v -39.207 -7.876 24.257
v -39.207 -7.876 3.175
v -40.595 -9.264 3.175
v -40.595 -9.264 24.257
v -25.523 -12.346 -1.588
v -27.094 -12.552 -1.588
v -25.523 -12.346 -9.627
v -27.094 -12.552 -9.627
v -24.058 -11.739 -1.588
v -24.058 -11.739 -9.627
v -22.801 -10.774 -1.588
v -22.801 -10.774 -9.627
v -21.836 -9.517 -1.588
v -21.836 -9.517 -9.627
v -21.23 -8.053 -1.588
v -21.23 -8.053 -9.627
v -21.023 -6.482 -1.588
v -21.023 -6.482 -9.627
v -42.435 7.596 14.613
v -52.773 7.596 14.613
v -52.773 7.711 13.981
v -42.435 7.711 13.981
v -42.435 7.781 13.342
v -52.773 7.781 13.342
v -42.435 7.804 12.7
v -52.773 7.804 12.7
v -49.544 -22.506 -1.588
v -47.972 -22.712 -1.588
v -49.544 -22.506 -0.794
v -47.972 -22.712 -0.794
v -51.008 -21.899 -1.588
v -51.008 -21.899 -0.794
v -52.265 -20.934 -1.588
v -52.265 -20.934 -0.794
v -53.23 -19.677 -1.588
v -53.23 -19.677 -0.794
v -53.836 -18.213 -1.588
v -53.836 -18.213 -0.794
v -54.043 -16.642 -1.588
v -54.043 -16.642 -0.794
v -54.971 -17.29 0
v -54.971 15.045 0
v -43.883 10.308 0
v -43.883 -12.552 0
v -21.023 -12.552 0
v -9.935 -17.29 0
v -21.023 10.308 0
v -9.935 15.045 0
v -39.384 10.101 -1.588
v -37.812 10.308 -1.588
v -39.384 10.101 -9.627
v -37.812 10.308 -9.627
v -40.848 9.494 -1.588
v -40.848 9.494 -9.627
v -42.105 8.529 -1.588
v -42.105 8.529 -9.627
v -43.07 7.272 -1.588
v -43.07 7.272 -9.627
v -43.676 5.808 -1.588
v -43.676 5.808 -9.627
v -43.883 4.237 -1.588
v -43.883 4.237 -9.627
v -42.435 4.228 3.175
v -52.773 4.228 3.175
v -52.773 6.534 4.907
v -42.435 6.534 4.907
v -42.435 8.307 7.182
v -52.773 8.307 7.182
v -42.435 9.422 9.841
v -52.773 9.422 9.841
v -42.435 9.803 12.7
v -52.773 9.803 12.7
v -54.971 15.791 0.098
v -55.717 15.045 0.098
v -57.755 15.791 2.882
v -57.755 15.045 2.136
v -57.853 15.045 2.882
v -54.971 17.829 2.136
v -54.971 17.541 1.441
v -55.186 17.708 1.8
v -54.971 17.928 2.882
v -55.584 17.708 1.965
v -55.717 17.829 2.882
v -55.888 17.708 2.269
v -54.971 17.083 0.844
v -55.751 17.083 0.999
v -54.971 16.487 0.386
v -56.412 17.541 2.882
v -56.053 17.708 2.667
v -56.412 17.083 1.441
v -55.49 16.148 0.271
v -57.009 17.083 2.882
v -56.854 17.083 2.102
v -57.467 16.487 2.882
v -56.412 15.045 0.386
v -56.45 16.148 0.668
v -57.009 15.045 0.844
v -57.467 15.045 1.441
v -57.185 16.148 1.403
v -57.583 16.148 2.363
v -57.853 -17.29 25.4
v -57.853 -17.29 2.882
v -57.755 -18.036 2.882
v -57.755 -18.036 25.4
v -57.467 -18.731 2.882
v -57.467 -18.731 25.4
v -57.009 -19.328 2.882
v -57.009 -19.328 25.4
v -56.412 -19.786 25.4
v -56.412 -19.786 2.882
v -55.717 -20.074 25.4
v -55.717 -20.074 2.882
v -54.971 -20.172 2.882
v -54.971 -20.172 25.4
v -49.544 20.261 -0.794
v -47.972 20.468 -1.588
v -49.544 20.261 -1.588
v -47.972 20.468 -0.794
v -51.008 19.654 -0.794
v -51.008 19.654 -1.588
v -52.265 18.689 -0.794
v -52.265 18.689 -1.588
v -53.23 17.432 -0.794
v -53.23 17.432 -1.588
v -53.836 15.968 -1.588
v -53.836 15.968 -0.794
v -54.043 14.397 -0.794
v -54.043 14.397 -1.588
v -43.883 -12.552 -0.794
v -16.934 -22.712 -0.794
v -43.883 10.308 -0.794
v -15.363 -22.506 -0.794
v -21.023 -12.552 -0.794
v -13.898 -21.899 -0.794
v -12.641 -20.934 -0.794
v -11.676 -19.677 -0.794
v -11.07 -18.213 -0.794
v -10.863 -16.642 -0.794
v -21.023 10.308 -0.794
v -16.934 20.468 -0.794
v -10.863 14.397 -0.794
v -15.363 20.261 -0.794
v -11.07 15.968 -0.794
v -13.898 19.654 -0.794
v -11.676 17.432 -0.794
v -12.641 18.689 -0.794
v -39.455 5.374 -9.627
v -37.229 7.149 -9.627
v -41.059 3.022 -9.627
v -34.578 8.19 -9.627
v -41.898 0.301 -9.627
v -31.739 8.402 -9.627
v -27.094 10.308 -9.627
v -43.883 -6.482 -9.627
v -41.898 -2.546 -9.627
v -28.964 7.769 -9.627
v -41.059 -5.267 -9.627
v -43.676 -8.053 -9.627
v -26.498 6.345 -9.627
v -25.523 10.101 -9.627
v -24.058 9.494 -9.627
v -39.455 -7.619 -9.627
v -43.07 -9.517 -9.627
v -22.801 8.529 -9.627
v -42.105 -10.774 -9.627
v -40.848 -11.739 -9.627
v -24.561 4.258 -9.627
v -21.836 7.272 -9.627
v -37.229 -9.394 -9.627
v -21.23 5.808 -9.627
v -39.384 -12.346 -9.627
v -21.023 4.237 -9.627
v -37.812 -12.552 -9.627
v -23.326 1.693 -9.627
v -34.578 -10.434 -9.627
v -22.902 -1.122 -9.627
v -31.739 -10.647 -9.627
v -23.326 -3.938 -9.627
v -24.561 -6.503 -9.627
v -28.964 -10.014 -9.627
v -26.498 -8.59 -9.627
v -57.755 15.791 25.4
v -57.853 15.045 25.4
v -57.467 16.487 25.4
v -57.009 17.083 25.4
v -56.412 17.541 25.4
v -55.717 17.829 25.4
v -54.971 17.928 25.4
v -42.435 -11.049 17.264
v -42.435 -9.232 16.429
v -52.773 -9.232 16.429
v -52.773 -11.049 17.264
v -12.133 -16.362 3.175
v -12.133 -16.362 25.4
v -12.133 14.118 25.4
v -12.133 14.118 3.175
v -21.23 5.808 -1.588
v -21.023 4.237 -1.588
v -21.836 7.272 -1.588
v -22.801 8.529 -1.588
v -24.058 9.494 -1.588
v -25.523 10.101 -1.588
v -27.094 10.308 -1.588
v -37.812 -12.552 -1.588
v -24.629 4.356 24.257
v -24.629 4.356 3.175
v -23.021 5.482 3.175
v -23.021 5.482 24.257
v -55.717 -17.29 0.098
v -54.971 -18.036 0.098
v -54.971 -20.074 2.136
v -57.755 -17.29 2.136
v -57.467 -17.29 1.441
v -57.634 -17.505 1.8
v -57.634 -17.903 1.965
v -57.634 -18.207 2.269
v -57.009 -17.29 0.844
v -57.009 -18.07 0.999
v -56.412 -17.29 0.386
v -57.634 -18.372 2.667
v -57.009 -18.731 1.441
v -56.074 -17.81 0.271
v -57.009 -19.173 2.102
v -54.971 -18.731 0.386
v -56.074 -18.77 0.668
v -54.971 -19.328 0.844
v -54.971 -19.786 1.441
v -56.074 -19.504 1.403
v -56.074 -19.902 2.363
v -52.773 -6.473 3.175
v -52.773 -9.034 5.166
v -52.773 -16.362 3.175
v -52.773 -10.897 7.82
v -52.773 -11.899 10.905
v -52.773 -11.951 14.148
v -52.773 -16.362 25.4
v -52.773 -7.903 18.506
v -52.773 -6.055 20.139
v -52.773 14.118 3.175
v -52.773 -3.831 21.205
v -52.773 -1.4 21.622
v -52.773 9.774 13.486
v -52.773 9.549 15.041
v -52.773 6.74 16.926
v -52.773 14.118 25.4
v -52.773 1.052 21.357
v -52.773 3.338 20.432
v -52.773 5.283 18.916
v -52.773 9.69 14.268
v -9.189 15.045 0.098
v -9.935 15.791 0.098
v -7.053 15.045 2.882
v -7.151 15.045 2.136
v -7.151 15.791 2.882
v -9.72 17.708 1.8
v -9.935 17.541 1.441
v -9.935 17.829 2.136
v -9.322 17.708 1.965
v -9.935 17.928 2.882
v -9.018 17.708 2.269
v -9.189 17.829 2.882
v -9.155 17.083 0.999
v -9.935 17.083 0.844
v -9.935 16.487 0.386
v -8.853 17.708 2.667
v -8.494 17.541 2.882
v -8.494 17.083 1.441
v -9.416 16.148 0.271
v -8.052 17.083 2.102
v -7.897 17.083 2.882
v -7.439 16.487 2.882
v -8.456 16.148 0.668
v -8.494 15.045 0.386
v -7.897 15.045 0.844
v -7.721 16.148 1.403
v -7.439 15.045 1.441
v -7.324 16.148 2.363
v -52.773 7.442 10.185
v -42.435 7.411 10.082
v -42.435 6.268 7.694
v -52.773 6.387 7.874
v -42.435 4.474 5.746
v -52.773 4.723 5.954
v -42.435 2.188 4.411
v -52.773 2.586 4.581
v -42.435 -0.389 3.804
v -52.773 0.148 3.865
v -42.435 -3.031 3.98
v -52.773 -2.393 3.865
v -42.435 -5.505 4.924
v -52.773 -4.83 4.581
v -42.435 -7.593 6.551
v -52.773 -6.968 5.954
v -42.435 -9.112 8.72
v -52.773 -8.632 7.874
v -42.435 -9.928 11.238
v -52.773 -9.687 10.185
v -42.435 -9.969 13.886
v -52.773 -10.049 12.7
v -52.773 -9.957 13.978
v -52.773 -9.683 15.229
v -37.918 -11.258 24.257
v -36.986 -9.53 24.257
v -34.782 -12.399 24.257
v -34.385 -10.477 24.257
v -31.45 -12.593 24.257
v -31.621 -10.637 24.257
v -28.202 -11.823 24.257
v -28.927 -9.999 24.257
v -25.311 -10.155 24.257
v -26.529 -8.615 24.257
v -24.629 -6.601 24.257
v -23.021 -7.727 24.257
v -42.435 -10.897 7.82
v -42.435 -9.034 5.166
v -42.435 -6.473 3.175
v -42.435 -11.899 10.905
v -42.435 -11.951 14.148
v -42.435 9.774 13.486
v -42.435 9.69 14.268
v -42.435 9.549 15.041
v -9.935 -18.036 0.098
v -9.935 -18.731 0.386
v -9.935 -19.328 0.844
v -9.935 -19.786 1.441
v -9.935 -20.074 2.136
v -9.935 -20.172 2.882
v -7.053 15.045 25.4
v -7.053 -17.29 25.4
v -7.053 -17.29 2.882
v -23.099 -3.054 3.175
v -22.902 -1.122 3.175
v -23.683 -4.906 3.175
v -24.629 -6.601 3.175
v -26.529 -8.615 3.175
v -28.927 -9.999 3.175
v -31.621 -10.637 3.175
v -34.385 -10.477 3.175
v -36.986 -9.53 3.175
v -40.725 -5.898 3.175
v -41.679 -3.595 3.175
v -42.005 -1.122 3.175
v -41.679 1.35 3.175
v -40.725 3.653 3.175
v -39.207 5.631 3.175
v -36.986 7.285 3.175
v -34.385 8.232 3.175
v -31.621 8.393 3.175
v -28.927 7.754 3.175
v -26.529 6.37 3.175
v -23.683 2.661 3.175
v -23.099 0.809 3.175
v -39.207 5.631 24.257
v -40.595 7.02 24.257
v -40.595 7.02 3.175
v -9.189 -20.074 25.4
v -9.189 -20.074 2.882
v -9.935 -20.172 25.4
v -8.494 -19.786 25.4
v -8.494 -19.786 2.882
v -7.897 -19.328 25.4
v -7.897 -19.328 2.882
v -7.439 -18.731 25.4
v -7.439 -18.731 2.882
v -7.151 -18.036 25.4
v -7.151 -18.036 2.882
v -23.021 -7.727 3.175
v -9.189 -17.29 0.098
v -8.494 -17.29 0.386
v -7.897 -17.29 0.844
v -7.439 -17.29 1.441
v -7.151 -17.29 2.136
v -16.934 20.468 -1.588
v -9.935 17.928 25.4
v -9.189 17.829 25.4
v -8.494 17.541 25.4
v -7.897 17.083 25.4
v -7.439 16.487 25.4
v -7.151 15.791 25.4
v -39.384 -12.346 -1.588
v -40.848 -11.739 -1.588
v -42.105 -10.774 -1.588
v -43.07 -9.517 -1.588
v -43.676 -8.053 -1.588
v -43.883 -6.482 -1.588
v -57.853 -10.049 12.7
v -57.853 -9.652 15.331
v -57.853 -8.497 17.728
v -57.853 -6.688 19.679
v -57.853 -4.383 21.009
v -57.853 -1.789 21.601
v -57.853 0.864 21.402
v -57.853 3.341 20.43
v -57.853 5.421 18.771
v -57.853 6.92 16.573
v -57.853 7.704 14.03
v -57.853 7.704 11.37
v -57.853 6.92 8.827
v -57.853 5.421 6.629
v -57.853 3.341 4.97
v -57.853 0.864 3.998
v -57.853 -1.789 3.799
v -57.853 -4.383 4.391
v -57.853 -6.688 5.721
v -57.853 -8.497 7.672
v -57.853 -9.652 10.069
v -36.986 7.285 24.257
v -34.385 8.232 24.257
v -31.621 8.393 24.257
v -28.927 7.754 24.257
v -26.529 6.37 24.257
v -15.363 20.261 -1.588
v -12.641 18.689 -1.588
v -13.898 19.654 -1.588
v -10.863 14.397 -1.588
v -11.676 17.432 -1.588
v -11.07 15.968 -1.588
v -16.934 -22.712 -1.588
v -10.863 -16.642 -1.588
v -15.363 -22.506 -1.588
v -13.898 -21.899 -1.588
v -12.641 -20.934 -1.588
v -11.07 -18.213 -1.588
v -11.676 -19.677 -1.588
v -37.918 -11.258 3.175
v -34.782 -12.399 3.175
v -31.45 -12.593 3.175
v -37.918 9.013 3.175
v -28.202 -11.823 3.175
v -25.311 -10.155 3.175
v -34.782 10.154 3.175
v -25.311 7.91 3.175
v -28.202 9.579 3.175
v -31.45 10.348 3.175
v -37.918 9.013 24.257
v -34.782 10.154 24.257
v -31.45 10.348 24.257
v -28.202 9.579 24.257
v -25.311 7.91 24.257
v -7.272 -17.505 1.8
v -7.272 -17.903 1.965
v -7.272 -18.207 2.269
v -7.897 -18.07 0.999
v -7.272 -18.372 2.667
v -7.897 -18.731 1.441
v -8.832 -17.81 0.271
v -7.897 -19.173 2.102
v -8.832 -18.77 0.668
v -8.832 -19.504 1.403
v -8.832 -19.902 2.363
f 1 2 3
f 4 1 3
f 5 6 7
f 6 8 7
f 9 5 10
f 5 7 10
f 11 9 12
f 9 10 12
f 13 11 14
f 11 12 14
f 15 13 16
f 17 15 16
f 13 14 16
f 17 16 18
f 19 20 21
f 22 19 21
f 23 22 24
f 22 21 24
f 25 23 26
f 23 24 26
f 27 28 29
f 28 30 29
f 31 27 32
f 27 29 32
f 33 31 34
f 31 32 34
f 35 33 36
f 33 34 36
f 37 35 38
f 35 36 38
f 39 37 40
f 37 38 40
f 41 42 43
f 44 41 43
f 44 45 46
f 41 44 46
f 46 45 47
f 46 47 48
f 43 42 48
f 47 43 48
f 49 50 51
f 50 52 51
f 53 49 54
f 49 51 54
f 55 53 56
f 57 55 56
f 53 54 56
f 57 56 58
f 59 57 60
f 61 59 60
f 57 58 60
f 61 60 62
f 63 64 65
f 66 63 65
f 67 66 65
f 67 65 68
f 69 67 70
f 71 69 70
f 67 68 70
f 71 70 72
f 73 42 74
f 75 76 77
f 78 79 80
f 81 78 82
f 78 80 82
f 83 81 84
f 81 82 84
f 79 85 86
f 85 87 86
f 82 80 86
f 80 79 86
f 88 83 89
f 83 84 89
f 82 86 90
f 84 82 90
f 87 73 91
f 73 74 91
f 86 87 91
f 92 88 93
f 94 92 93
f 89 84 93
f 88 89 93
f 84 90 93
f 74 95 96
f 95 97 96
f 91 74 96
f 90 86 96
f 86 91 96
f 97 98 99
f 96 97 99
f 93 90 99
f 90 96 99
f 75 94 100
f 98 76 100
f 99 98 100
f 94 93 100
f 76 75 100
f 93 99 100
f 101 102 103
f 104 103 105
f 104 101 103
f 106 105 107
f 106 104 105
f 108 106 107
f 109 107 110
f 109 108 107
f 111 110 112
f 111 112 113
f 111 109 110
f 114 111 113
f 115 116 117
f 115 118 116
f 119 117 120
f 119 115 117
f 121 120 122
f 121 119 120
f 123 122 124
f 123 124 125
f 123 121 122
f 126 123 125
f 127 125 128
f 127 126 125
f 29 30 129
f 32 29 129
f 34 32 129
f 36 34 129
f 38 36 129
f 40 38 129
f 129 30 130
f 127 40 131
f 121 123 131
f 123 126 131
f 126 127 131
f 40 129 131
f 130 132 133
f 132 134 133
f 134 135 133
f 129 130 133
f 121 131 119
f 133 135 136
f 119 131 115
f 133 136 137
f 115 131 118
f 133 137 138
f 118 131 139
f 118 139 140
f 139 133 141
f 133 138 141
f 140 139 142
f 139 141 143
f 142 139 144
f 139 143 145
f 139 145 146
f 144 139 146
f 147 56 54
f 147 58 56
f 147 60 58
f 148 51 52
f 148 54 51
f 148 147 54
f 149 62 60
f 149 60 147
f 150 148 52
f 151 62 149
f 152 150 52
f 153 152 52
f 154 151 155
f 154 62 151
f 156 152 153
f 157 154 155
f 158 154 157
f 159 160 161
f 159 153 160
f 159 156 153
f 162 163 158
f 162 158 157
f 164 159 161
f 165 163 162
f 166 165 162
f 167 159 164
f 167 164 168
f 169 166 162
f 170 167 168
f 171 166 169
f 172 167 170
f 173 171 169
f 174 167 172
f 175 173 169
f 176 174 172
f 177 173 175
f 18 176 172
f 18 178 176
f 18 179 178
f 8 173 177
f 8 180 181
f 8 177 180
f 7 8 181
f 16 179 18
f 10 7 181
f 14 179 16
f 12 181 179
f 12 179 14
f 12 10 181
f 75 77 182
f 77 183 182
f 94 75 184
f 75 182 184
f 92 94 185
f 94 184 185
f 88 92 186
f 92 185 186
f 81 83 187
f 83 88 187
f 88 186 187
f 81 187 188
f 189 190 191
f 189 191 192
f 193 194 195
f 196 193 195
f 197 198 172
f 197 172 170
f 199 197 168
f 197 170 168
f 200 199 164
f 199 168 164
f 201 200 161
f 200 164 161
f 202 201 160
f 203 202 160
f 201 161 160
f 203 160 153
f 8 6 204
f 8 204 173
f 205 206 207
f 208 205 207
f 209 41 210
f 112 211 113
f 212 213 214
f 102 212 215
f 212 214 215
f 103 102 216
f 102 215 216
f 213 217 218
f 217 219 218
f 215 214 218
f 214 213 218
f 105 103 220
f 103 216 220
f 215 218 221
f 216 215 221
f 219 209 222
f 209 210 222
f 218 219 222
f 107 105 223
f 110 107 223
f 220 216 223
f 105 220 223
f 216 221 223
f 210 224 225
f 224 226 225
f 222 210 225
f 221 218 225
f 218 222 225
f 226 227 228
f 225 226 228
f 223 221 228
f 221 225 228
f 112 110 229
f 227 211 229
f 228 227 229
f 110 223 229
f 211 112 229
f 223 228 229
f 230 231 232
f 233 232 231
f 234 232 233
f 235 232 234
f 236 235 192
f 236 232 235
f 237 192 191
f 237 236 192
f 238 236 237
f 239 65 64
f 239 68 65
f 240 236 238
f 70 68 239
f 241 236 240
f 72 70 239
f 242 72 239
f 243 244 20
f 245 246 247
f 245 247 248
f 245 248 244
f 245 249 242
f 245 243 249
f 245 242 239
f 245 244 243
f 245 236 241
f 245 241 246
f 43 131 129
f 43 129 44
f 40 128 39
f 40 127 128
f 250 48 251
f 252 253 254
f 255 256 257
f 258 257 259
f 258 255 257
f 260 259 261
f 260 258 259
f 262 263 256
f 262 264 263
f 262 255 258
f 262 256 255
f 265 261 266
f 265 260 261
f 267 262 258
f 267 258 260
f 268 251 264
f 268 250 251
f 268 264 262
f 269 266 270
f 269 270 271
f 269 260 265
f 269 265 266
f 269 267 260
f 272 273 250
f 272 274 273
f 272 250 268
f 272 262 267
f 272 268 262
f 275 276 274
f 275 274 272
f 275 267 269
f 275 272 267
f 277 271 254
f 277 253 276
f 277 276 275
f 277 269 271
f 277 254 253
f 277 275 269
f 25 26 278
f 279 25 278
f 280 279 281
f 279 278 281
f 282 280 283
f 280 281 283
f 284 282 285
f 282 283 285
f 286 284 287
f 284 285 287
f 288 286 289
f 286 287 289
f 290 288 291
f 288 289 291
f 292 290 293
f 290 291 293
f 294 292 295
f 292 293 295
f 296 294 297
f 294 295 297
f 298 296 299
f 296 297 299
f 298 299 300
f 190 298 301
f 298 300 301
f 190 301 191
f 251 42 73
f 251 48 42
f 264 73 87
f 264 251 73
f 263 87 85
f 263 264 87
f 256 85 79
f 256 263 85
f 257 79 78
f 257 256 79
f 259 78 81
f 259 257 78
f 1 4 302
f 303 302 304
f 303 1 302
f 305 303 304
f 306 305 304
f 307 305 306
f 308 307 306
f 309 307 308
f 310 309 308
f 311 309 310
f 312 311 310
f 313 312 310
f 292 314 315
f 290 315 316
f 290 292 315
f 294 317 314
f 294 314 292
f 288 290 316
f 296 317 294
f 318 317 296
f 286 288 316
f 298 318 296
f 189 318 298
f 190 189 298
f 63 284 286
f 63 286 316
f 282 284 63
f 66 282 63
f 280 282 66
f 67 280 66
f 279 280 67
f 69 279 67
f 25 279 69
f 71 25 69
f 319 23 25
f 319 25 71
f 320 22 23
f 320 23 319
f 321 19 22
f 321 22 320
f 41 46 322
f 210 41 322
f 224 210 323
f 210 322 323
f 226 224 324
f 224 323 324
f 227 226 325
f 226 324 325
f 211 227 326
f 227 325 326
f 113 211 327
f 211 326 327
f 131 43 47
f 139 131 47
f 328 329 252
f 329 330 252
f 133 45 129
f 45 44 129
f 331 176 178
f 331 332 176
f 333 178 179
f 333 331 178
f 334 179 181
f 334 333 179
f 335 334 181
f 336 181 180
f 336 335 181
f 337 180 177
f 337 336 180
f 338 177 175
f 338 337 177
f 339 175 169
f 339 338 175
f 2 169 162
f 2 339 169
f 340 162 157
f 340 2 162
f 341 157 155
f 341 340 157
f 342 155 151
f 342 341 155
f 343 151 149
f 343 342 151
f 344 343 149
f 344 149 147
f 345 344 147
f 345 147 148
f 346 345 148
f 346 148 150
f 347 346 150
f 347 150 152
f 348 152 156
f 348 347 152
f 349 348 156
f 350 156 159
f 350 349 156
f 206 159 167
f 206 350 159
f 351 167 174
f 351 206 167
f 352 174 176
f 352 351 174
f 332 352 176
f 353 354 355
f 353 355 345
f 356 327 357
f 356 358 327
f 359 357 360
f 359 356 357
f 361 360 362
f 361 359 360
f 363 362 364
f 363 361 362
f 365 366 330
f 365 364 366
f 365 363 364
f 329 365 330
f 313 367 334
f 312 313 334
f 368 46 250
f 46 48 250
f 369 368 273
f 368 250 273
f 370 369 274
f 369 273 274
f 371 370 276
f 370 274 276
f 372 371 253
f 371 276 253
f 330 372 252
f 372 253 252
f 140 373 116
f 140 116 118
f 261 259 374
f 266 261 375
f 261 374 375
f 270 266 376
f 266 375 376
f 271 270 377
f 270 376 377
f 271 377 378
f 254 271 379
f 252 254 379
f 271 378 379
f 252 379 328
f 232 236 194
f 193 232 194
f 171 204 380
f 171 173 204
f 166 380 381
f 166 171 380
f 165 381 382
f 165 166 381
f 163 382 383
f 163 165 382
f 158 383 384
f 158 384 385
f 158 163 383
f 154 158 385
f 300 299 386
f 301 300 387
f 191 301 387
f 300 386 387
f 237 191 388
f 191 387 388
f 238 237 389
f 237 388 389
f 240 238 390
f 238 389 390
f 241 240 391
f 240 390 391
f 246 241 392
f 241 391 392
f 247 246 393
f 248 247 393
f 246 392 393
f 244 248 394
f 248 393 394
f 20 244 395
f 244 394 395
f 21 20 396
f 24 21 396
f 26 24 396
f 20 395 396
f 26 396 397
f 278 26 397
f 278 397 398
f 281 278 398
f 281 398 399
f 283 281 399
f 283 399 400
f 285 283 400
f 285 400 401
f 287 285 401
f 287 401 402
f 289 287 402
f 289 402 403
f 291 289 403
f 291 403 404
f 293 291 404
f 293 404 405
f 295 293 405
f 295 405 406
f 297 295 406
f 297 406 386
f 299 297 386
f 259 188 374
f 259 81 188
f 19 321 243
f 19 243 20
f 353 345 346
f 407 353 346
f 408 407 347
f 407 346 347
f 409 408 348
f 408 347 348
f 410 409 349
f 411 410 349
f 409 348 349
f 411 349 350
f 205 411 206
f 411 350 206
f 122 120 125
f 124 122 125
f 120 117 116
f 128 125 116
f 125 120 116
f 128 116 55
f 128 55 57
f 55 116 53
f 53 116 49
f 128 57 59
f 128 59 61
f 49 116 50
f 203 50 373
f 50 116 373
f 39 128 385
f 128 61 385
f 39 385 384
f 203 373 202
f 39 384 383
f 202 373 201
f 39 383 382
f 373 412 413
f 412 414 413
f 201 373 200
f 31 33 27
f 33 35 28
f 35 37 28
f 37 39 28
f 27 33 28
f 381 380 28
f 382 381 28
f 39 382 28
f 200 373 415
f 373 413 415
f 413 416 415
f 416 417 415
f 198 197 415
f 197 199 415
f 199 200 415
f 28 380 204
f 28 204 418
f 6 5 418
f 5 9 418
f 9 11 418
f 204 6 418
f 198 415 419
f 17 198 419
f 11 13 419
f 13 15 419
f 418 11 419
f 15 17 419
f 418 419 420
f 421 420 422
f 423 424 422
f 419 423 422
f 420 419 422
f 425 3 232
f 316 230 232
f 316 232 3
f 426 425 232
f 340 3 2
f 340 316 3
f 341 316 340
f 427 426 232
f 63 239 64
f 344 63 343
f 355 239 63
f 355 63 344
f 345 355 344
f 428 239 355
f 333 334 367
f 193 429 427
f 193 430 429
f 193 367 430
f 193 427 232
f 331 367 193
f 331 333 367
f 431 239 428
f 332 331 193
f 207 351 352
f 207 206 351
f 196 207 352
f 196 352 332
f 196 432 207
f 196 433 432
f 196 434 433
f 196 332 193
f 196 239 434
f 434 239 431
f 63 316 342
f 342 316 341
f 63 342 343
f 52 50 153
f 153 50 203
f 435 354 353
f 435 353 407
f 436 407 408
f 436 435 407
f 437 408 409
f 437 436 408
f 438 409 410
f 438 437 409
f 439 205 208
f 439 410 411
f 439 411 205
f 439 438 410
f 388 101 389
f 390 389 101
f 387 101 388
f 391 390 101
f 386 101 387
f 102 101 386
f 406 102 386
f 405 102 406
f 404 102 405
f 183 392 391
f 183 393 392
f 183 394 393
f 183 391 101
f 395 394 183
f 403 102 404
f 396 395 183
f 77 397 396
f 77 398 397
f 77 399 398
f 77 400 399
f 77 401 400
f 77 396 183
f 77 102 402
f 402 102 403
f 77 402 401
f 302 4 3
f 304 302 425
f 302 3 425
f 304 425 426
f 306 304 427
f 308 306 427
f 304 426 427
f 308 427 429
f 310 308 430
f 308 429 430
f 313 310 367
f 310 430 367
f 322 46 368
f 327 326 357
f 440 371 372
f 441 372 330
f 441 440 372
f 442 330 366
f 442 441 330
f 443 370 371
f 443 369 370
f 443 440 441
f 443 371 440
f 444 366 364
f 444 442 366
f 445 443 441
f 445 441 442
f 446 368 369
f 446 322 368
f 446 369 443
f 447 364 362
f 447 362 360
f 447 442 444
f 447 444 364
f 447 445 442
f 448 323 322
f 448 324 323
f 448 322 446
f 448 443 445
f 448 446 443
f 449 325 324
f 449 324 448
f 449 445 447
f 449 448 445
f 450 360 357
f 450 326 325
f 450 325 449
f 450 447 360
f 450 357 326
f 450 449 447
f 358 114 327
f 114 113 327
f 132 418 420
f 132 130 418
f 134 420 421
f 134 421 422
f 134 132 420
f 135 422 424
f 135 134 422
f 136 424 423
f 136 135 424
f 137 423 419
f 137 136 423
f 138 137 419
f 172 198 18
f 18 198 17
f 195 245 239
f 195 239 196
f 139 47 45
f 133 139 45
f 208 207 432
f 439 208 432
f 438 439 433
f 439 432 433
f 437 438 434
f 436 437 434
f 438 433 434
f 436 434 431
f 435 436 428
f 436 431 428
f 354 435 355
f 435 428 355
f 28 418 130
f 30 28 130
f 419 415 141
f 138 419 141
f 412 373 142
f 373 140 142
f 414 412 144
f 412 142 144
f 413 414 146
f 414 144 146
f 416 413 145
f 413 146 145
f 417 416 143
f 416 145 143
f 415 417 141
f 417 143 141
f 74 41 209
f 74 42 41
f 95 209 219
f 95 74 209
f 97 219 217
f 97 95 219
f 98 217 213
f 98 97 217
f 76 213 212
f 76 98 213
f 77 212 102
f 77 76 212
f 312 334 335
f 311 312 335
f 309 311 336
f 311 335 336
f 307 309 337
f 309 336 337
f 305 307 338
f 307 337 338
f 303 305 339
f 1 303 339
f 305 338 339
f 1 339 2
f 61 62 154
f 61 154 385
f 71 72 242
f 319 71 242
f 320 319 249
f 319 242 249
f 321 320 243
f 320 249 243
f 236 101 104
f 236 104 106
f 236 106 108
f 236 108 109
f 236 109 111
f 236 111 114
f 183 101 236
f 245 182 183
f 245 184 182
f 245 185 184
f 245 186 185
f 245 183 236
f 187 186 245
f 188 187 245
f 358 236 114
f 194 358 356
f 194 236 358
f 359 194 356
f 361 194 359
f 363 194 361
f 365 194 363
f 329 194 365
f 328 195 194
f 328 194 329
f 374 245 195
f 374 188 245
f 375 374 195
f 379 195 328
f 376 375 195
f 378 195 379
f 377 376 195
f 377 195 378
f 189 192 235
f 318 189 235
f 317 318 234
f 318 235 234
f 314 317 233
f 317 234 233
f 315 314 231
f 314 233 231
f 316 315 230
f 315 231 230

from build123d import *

# Parameters (mm, degrees)
F0_W      = 50.8
F0_H      = 38.1
F1_DEPTH  = 25.4
F2_W      = 40.64
F2_H      = 30.48
F3_DEPTH  = 22.225
F4_R      = 9.5514218063
F5_DEPTH  = 25.4
F6_R      = 8.9260934587
F7_DEPTH  = 25.4
F9_DEPTH  = 10.3378
F11_DEPTH = 21.082
F12_W     = 22.86
F12_H     = 22.86
F12_R     = 10.7189198073
F12_R_2   = 9.5514218063
F13_DEPTH = 9.6266
F14_W     = 22.86
F14_H     = 0.79375
F15_DEPTH = 10.16
F17_DEPTH = 10.16
F18_W     = 10.16
F18_H     = 0.79375
F18_W_2   = 22.86
F19_DEPTH = 10.16
F20_W     = 10.16
F20_H     = 0.79375
F20_W_2   = 22.86
F21_DEPTH = 10.16
F22_R     = 6.0707814239
F23_R     = 2.8820881508


# Not quite as in the source:
# - a length typed as a fraction of an inch, garbled in the dataset ("3 / 203.2 mm" for 3/8 in), is restored
# - a feature names something its author has since deleted; it is built from what else it names


with BuildPart() as f1:
    # F0 (on Top) → F1 (new body)
    with BuildSketch(Plane.XY):
        with Locations((-32.453101594, -1.12241521)):
            Rectangle(F0_W, F0_H)
    extrude(amount=F1_DEPTH)

    # F2 (on face) → F3 (cut)
    with BuildSketch(Plane.XY.offset(25.4)):
        with Locations((-32.453101594, -1.12241521)):
            Rectangle(F2_W, F2_H)
    extrude(amount=-F3_DEPTH, mode=Mode.SUBTRACT)

    # F4 (on face) → F5 (cut)
    with BuildSketch(Plane.XY.offset(3.175)):
        with Locations((-32.453101594, -1.12241521)):
            Circle(F4_R)
    extrude(amount=-F5_DEPTH, mode=Mode.SUBTRACT)

    # F6 (on face) → F7 (cut)
    with BuildSketch(Plane(origin=(-57.853101594, 0, 0), x_dir=(0, -1, 0), z_dir=(-1, 0, 0))):
        with Locations((1.12241521, 12.7)):
            Circle(F6_R)
    extrude(amount=-F7_DEPTH, mode=Mode.SUBTRACT)

    # F8 (on face) → F9 (join)
    with BuildSketch(Plane.YZ.offset(-52.773101594)):
        with BuildLine():
            ThreePointArc((4.2283937472, 3.175), (8.3066529455, 7.1818974988), (9.8026377187, 12.7))
            ThreePointArc((9.8026377187, 12.7), (9.7389872891, 13.8775895924), (9.5487776675, 15.0414576799))
            Line((9.5487776675, 15.0414576799), (7.5962670299, 14.6130406248))
            ThreePointArc((7.5962670299, 14.6130406248), (7.7516739529, 13.6621257514), (7.8036782487, 12.7))
            ThreePointArc((7.8036782487, 12.7), (-3.0308273005, 3.9803034613), (-9.2324659679, 16.4285682425))
            Line((-9.2324659679, 16.4285682425), (-11.0486762552, 17.2635647427))
            ThreePointArc((-11.0486762552, 17.2635647427), (-11.5132347682, 9.3254407095), (-6.4732241672, 3.175))
            Line((-6.4732241672, 3.175), (4.2283937472, 3.175))
        make_face()
    extrude(amount=F9_DEPTH)

    # F10 (on face) → F11 (join)
    with BuildSketch(Plane.XY.offset(3.175)):
        with BuildLine():
            Line((-24.6290348955, 4.3560552717), (-23.0209375751, 5.4820571376))
            ThreePointArc((-23.0209375751, 5.4820571376), (-31.4495427718, 10.3483146168), (-40.5951152599, 7.0195984558))
            Line((-40.5951152599, 7.0195984558), (-39.2069767232, 5.6314599192))
            ThreePointArc((-39.2069767232, 5.6314599192), (-31.6206403322, 8.3926605526), (-24.6290348955, 4.3560552717))
        make_face()
        with BuildLine():
            ThreePointArc((-40.5951152599, -9.2644288759), (-31.4495427718, -12.5931450369), (-23.0209375751, -7.7268875577))
            Line((-23.0209375751, -7.7268875577), (-24.6290348955, -6.6008856918))
            ThreePointArc((-24.6290348955, -6.6008856918), (-31.6206403322, -10.6374909727), (-39.2069767232, -7.8762903393))
            Line((-39.2069767232, -7.8762903393), (-40.5951152599, -9.2644288759))
        make_face()
    extrude(amount=F11_DEPTH)

    # F12 (on face) → F13 (join)
    with BuildSketch(Plane(origin=(0, 0, 0), x_dir=(1, 0, 0), z_dir=(0, 0, -1))):
        with Locations((-32.453101594, 1.12241521)):
            Rectangle(F12_W, F12_H)
        with Locations((-32.453101594, 1.12241521)):
            Circle(F12_R, mode=Mode.SUBTRACT)
        with Locations((-32.453101594, 1.12241521)):
            Circle(F12_R)
        with Locations((-32.453101594, 1.12241521)):
            Circle(F12_R_2, mode=Mode.SUBTRACT)
    extrude(amount=F13_DEPTH)

    # F14 (on face) → F15 (join)
    with BuildSketch(Plane(origin=(0, 10.30758479, 0), x_dir=(-1, 0, 0), z_dir=(0, 1, 0))):
        with Locations((32.453101594, -1.190625)):
            Rectangle(F14_W, F14_H)
    extrude(amount=F15_DEPTH)

    # F16 (on face) → F17 (join)
    with BuildSketch(Plane.YZ.offset(-21.023101594)):
        Polygon((-12.55241521, -0.79375), (-12.55241521, -1.5875), (10.30758479, -1.5875), (20.46758479, -1.5875), (20.46758479, -0.79375), (10.30758479, -0.79375), align=None)
    extrude(amount=F17_DEPTH)

    # F18 (on face) → F19 (join)
    with BuildSketch(Plane.XZ.offset(12.55241521)):
        with Locations((-15.943101594, -1.190625)):
            Rectangle(F18_W, F18_H)
        with Locations((-32.453101594, -1.190625)):
            Rectangle(F18_W_2, F18_H)
    extrude(amount=F19_DEPTH)

    # F20 (on face) → F21 (join)
    with BuildSketch(Plane(origin=(-43.883101594, 0, 0), x_dir=(0, -1, 0), z_dir=(-1, 0, 0))):
        with Locations((-15.38758479, -1.190625)):
            Rectangle(F20_W, F20_H)
        with Locations((1.12241521, -1.190625)):
            Rectangle(F20_W_2, F20_H)
        with Locations((17.63241521, -1.190625)):
            Rectangle(F20_W, F20_H)
    extrude(amount=F21_DEPTH)

    # F22
    f22_edges = [f1.edges().sort_by_distance(p)[0] for p in [
        (-10.863102, 20.467585, -1.190625),
        (-54.043102, 20.467585, -1.190625),
        (-54.043102, -22.712415, -1.190625),
        (-10.863102, -22.712415, -1.190625),
        (-21.023102, -12.552415, -5.60705),
        (-43.883102, -12.552415, -5.60705),
        (-43.883102, 10.307585, -5.60705),
        (-21.023102, 10.307585, -5.60705),
    ]]
    fillet(f22_edges, radius=F22_R)

    # F23
    f23_edges = [f1.edges().sort_by_distance(p)[0] for p in [
        (-32.453102, -20.172415, 0),
        (-57.853102, -1.122415, 0),
        (-57.853102, -20.172415, 12.7),
        (-7.053102, -1.122415, 0),
        (-7.053102, -20.172415, 12.7),
        (-32.453102, 17.927585, 0),
        (-7.053102, 17.927585, 12.7),
        (-57.853102, 17.927585, 12.7),
    ]]
    fillet(f23_edges, radius=F23_R)


solid = f1.part
